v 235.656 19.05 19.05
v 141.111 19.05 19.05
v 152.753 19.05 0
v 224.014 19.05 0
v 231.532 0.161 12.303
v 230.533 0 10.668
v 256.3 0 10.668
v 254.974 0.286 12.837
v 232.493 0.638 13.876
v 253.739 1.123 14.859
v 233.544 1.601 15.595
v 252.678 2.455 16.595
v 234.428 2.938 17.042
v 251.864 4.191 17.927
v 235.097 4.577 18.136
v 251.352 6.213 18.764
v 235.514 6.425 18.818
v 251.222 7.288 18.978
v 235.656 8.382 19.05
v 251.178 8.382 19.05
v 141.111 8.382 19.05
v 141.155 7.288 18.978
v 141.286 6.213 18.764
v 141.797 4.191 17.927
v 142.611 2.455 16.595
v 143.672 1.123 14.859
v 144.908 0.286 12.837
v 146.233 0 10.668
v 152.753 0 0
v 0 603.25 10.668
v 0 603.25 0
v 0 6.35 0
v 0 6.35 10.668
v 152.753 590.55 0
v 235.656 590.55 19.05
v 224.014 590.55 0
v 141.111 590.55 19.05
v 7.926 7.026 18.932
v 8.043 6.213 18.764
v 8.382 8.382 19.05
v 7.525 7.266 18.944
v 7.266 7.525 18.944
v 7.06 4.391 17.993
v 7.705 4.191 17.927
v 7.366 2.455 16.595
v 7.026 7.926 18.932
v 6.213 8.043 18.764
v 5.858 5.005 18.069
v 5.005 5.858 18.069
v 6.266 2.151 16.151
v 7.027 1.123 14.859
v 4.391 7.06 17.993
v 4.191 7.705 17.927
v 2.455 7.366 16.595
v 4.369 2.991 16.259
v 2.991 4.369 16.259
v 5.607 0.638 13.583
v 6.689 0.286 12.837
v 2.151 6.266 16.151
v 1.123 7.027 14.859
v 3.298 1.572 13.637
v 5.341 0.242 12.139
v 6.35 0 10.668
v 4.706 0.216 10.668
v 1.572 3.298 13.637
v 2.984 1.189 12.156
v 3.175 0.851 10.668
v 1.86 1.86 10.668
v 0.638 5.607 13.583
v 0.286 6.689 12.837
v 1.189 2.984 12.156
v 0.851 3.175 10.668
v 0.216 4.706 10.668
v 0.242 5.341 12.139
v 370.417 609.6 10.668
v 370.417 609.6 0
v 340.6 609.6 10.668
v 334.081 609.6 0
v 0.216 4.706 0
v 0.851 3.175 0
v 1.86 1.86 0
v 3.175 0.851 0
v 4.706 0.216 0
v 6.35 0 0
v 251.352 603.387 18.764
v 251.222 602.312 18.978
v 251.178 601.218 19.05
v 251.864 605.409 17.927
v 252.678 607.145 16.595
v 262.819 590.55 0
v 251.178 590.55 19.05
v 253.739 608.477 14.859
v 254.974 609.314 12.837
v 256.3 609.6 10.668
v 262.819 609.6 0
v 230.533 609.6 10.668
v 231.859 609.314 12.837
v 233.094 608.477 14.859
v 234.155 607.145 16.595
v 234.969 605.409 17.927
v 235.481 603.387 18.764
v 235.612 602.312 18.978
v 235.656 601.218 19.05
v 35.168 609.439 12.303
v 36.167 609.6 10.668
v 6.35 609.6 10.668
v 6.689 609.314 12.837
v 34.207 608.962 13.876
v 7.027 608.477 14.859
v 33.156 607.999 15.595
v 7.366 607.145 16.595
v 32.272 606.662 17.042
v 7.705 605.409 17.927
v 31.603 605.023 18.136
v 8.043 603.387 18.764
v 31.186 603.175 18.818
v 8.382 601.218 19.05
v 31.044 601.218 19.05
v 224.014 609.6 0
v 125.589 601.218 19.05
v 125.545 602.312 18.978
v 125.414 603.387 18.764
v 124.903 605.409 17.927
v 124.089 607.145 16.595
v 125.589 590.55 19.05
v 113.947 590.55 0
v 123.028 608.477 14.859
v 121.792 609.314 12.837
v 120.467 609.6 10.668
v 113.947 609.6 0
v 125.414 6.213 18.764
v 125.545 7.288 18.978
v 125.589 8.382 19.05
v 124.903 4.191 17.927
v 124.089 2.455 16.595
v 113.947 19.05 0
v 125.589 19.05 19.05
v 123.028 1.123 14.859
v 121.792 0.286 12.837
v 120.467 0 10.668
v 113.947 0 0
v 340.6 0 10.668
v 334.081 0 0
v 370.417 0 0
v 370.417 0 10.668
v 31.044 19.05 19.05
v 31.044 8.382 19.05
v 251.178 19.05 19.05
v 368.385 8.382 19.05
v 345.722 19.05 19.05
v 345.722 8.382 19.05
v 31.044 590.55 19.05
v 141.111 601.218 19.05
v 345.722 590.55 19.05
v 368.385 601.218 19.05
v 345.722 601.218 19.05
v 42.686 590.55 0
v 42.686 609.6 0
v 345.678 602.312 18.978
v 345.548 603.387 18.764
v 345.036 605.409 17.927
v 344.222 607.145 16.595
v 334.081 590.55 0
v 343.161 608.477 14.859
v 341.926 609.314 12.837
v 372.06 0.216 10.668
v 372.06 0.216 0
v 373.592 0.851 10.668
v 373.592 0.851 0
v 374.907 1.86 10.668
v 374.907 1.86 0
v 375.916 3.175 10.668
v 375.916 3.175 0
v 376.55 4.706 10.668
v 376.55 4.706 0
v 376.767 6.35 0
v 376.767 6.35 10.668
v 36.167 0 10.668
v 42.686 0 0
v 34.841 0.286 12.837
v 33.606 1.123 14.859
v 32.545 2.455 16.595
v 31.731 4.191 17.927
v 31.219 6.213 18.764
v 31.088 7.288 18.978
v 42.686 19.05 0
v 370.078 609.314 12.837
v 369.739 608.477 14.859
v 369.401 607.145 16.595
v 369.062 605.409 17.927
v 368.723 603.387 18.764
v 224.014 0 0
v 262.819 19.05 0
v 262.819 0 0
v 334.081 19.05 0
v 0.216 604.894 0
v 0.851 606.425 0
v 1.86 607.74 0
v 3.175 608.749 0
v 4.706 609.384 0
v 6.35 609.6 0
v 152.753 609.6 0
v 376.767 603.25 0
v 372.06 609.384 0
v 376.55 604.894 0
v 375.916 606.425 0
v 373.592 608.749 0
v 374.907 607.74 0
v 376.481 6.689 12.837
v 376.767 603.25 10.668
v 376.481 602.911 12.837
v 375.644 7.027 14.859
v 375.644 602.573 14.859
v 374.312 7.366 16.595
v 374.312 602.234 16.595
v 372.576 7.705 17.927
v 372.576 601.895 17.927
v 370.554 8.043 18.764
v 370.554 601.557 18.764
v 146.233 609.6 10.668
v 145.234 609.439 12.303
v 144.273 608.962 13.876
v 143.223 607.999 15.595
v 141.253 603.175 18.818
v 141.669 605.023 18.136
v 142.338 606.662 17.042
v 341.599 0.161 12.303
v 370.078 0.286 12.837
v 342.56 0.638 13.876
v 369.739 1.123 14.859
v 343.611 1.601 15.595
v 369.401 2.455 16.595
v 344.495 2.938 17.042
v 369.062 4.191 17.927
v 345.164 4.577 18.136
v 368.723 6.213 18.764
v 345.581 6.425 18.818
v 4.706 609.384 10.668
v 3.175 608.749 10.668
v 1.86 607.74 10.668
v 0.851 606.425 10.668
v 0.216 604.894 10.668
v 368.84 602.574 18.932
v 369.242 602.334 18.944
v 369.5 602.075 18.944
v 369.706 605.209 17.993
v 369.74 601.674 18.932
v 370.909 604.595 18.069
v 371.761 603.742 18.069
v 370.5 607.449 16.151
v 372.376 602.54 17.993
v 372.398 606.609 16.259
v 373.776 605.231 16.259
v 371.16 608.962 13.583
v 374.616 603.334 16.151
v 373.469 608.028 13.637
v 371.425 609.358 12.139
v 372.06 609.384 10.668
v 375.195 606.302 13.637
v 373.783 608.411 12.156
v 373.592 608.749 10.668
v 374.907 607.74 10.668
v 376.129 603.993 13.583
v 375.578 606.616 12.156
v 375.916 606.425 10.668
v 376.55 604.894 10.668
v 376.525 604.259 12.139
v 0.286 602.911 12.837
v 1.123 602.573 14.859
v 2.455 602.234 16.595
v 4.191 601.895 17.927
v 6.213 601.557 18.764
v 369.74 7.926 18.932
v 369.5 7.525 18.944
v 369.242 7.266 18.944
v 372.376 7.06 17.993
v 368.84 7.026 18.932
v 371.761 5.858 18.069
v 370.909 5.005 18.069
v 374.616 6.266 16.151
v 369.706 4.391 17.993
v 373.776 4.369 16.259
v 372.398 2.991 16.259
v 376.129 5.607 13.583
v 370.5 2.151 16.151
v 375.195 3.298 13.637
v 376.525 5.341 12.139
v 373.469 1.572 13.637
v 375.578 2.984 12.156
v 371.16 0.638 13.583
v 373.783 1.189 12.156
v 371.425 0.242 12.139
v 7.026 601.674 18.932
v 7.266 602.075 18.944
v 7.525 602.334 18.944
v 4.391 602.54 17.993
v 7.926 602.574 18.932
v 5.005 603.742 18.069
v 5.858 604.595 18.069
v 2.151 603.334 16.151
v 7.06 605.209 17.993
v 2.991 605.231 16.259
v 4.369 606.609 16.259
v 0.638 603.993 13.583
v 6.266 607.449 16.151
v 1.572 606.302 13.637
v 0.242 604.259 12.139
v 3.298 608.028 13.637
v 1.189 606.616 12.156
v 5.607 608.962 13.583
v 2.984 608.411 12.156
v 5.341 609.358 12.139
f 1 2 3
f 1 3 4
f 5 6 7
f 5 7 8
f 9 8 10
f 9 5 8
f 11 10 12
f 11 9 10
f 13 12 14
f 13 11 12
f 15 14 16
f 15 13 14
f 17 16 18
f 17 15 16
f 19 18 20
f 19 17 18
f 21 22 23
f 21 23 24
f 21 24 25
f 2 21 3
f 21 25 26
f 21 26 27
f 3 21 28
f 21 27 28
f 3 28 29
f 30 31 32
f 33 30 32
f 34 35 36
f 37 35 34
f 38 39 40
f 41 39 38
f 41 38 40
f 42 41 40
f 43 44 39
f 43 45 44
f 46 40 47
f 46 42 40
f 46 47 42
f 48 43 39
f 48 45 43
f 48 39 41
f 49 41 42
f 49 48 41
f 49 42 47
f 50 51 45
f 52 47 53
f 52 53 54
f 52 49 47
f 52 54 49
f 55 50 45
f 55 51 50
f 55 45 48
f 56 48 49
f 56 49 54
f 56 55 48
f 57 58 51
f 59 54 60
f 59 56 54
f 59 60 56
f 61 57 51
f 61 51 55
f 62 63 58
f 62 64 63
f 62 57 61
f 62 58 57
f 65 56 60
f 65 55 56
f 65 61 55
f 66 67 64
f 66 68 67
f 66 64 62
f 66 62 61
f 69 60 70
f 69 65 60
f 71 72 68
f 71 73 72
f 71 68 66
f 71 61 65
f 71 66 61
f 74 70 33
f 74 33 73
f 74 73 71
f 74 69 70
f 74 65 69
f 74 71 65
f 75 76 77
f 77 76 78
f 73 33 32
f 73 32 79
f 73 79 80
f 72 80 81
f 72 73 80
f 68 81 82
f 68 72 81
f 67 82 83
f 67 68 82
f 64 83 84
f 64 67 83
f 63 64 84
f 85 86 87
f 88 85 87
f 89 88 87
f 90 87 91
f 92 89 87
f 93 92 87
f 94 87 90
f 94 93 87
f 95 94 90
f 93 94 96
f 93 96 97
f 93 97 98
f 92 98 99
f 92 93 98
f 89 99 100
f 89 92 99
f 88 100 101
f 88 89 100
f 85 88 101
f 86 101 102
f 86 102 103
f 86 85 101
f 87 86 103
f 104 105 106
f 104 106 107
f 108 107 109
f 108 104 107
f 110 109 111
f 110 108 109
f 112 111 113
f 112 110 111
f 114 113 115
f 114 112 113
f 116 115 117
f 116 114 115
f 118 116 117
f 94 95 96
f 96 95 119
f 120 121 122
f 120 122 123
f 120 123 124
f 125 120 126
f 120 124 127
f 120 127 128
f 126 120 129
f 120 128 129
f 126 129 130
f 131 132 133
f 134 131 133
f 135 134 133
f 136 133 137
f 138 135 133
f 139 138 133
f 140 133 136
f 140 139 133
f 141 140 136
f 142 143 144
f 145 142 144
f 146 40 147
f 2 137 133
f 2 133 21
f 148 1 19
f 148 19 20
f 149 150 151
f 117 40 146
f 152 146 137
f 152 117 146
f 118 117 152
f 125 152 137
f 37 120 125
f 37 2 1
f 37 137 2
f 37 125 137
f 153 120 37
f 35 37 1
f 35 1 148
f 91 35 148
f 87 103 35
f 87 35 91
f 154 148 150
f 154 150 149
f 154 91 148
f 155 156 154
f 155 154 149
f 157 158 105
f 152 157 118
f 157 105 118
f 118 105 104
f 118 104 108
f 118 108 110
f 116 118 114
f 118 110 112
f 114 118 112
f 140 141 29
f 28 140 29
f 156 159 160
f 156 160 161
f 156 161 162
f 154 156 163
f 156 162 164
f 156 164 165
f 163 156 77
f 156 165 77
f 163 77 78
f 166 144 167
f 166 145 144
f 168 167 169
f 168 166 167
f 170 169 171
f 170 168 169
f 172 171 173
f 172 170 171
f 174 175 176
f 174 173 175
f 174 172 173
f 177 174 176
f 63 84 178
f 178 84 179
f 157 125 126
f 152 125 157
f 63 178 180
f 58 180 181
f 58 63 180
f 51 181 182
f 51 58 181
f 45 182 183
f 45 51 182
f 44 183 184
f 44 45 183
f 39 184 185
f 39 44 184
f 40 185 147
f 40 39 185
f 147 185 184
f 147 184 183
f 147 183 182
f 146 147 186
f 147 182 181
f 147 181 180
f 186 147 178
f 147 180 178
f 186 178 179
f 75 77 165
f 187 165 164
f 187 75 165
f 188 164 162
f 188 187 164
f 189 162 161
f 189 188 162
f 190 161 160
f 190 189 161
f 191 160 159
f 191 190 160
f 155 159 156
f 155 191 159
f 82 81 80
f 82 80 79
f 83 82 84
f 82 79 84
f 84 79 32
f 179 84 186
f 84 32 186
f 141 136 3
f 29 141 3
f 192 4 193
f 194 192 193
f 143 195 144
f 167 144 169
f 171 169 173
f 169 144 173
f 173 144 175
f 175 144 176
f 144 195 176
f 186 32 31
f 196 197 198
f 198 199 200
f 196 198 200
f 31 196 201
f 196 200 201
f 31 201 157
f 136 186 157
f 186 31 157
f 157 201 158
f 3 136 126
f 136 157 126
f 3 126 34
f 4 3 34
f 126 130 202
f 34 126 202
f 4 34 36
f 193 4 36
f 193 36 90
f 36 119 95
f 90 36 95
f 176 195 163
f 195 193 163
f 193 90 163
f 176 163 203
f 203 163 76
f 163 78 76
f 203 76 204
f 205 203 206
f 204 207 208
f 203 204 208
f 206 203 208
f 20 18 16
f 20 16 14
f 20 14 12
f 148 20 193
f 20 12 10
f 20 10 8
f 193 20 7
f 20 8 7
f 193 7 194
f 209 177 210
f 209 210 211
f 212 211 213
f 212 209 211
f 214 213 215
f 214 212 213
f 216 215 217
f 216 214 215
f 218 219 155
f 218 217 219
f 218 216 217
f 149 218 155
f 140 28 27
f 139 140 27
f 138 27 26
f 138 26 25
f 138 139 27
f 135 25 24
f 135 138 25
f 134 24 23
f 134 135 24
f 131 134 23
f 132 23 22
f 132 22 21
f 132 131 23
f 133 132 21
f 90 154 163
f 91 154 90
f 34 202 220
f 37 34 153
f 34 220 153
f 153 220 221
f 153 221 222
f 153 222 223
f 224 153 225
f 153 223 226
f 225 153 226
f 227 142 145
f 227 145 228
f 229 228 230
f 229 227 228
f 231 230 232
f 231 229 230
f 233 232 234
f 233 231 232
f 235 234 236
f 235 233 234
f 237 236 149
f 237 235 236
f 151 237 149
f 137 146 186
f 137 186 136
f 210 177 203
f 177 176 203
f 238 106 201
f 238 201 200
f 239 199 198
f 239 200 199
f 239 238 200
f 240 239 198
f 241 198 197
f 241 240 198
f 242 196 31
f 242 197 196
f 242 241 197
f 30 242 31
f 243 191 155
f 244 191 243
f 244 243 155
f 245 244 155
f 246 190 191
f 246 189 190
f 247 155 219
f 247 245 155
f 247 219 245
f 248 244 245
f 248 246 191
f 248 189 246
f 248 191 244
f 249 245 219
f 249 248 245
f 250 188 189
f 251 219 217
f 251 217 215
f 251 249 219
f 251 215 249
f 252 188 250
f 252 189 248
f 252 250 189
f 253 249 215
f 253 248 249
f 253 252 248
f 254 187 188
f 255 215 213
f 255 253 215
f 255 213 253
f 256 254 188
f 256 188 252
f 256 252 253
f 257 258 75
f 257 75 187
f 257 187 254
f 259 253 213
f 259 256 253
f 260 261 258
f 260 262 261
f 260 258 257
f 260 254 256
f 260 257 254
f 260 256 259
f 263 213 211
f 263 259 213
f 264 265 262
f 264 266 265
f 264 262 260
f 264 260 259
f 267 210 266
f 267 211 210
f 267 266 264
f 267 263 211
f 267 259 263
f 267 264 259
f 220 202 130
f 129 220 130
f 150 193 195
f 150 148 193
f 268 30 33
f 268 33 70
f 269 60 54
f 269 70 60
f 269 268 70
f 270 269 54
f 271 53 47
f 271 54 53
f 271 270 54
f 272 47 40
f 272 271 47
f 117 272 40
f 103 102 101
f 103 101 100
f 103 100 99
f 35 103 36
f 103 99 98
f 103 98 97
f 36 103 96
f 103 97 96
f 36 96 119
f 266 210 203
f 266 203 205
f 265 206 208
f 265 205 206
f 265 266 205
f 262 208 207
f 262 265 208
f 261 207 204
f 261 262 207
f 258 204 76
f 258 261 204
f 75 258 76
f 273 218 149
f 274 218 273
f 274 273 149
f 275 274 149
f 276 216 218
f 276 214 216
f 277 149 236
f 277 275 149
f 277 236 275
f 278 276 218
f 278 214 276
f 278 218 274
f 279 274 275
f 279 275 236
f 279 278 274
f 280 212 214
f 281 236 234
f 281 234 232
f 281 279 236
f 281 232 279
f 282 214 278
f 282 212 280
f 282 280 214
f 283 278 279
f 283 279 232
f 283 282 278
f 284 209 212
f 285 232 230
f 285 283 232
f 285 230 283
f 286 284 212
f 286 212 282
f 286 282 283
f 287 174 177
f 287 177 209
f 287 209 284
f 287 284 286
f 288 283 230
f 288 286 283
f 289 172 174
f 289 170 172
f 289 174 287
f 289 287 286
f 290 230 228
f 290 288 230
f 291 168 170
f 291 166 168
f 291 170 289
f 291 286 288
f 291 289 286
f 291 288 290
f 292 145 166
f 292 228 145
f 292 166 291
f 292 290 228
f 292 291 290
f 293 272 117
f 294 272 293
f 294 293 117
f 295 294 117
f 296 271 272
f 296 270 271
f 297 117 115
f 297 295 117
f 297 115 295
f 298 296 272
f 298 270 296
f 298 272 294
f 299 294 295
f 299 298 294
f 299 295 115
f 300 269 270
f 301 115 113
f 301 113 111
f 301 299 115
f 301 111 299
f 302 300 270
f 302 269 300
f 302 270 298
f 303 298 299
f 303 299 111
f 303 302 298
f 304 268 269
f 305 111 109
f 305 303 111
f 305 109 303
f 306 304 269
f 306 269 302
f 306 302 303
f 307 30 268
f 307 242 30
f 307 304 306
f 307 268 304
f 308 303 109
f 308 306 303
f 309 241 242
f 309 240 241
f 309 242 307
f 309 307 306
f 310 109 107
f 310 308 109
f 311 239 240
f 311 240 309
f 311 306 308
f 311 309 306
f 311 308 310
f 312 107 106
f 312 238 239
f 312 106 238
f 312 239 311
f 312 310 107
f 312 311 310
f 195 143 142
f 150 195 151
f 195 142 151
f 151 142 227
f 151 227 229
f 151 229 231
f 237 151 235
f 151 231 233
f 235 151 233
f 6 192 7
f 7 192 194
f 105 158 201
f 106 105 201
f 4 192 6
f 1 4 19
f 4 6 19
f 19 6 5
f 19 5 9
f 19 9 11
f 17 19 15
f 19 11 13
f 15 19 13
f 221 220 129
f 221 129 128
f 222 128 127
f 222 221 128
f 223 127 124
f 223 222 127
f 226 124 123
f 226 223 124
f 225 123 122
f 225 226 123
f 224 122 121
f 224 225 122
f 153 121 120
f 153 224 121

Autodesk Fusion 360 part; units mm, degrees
sketch "Sketch2" plane through (0, 0, 0) normal (0, 0, 1) x (1, 0, 0)
  line L0 (0, 0) -> (376.7667, 0)
  line L1 (376.7667, 0) -> (376.7667, 609.6)
  line L2 (376.7667, 609.6) -> (0, 609.6)
  line L3 (0, 609.6) -> (0, 0)
  dimension "d4" = 376.7667
  dimension "d5" = 609.6
extrude "Extrude1" add sketch "Sketch2" along normal blind 19.05
sketch "Sketch3" plane through (0, 0, 19.05) normal (0, 0, 1) x (-1, 0, 0)
  line L0 (0, -609.6) -> (0, 0)
  line L1 (0, 0) -> (-376.7667, 0)
  line L2 (-376.7667, 0) -> (-376.7667, -609.6)
  line L3 (-376.7667, -609.6) -> (0, -609.6)
  line L4 (25.4, 0) -> (402.1667, 0)
  line L5 (402.1667, 0) -> (402.1667, -376.7667)
  line L6 (402.1667, -376.7667) -> (25.4, -376.7667)
  line L7 (25.4, -376.7667) -> (25.4, 0)
  dimension "d8" = 376.7667
  dimension "d9" = 376.7667
sketch "Sketch4" plane through (0, 0, 19.05) normal (0, 0, 1) x (-1, 0, 0)
  line L0 (0, -609.6) -> (0, 0)
  line L1 (0, 0) -> (-376.7667, 0)
  line L2 (-376.7667, 0) -> (-376.7667, -609.6)
  line L3 (-376.7667, -609.6) -> (0, -609.6)
  line L4 (25.4, 0) -> (71.9667, 0)
  line L5 (25.4, 0) -> (25.4, -25.4)
  line L6 (402.1667, -25.4) -> (402.1667, 0)
  line L7 (402.1667, -25.4) -> (402.1667, 0)
  line L8 (46.587, 0) -> (25.4, 0)
  line L9 (71.9667, 0) -> (56.4444, 0)
  line L10 (56.4444, 0) -> (71.9667, -25.4)
  line L11 (150.9889, 0) -> (135.4667, -25.4)
  line L12 (150.9889, 0) -> (166.5111, 0)
  line L13 (166.5111, 0) -> (182.0333, 0)
  line L14 (166.5111, 0) -> (182.0333, -25.4)
  line L15 (245.5333, -25.4) -> (261.0555, 0)
  line L16 (261.0555, 0) -> (276.5778, 0)
  line L17 (276.5778, 0) -> (292.1, -25.4)
  line L18 (355.6, -25.4) -> (371.1222, 0)
  line L19 (402.1667, 0) -> (386.6444, 0)
  line L20 (386.6444, 0) -> (371.1222, 0)
  line L21 (402.1667, 0) -> (402.1667, -376.7667)
  line L22 (402.1667, -188.3833) -> (25.4, -188.3833)
  line L23 (402.1667, -351.3667) -> (402.1667, -376.7667)
  line L24 (402.1667, -376.7667) -> (402.1667, 0)
  line L25 (166.5111, -376.7667) -> (182.0333, -376.7667)
  line L26 (386.6444, -376.7667) -> (371.1222, -376.7667)
  line L27 (25.4, -376.7667) -> (71.9667, -376.7667)
  line L28 (166.5111, -376.7667) -> (182.0333, -351.3667)
  line L29 (355.6, -351.3667) -> (371.1222, -376.7667)
  line L30 (402.1667, -351.3667) -> (402.1667, -376.7667)
  line L31 (56.4444, -376.7667) -> (71.9667, -351.3667)
  line L32 (245.5333, -351.3667) -> (261.0555, -376.7667)
  line L33 (25.4, -376.7667) -> (25.4, -351.3667)
  line L34 (261.0555, -376.7667) -> (276.5778, -376.7667)
  line L35 (71.9667, -376.7667) -> (56.4444, -376.7667)
  line L36 (46.587, -376.7667) -> (25.4, -376.7667)
  line L37 (276.5778, -376.7667) -> (292.1, -351.3667)
  line L38 (402.1667, -376.7667) -> (386.6444, -376.7667)
  line L39 (150.9889, -376.7667) -> (166.5111, -376.7667)
  line L40 (150.9889, -376.7667) -> (135.4667, -351.3667)
  line L41 (25.4, -25.4) -> (25.4, -19.05)
  line L42 (25.4, -19.05) -> (414.4129, -19.05)
  line L43 (402.1667, -351.3667) -> (402.1667, -357.7167)
  line L44 (402.1667, -357.7167) -> (12.7, -357.7167)
  dimension "d12" = 46.5667
  dimension "d13" = 25.4
  dimension "d14" = 376.7667
  dimension "d15" = 46.5667
  dimension "d16" = 63.5
  dimension "d17" = 46.5667
  dimension "d18" = 15.5222
  dimension "d20" = 15.5222
  dimension "d21" = 15.5222
  dimension "d22" = 63.5
  dimension "d24" = 46.5667
  dimension "d25" = 15.5222
  dimension "d26" = 63.5
  dimension "d456" = 376.7667
  dimension "d473" = 6.35
  dimension "d474" = 6.35
sketch "Sketch5" plane through (0, 609.6, 0) normal (0, 1, 0) x (-1, 0, 0)
  line L0 (-376.7667, 0) -> (0, 0)
  line L1 (0, 0) -> (0, 19.05)
  line L2 (0, 19.05) -> (-376.7667, 19.05)
  line L3 (-376.7667, 19.05) -> (-376.7667, 0)
  line L4 (-376.7667, 0) -> (0, 0)
  line L5 (-123.6562, -70.3757) -> (-108.134, -95.7757)
  line L6 (-328.2673, -70.3757) -> (-343.7895, -70.3757)
  line L7 (-343.7895, -70.3757) -> (-328.2673, -95.7757)
  line L8 (-154.7007, -95.7757) -> (-139.1784, -70.3757)
  line L9 (-233.7229, -70.3757) -> (-218.2007, -95.7757)
  line L10 (-374.834, -95.7757) -> (-328.2673, -95.7757)
  line L11 (-139.1784, -70.3757) -> (-123.6562, -70.3757)
  line L12 (-233.7229, -70.3757) -> (-218.2007, -70.3757)
  line L13 (-249.2451, -70.3757) -> (-264.7673, -95.7757)
  line L14 (-13.5895, -70.3757) -> (-29.1118, -70.3757)
  line L15 (-44.634, -95.7757) -> (-29.1118, -70.3757)
  line L16 (1.9327, -70.3757) -> (-13.5895, -70.3757)
  line L17 (1.9327, -95.7757) -> (1.9327, -70.3757)
  line L18 (-328.2673, -70.3757) -> (-249.2451, -70.3757)
  line L19 (-264.7673, -95.7757) -> (-328.2673, -95.7757)
  line L20 (-218.2007, -95.7757) -> (-154.7007, -95.7757)
  line L21 (-108.134, -95.7757) -> (-44.634, -95.7757)
  line L22 (-29.1118, -70.3757) -> (-123.6562, -70.3757)
  line L23 (-139.1784, -70.3757) -> (-233.7229, -70.3757)
  dimension "d463" = 63.5
  dimension "d464" = 46.5667
  dimension "d465" = 15.5222
  dimension "d466" = 15.5222
  dimension "d467" = 15.5222
  dimension "d468" = 63.5
  dimension "d469" = 46.5667
  dimension "d470" = 15.5222
  dimension "d471" = 63.5
sketch "Sketch6" plane through (0, 0, 0) normal (0, -1, 0) x (1, 0, 0)
  line L0 (0, 0) -> (376.7667, 0)
  line L1 (376.7667, 0) -> (376.7667, 19.05)
  line L2 (376.7667, 19.05) -> (0, 19.05)
  line L3 (0, 19.05) -> (0, 0)
  line L4 (46.5667, 19.05) -> (31.0444, 19.05)
  line L5 (0, -6.35) -> (0, 0)
  line L6 (361.2444, 19.05) -> (345.7222, 19.05)
  line L7 (376.7667, -6.35) -> (376.7667, 19.05)
  line L8 (31.0444, 19.05) -> (46.5667, -6.35)
  line L9 (235.6555, 19.05) -> (251.1778, 19.05)
  line L10 (125.5889, 19.05) -> (141.1111, 19.05)
  line L11 (330.2, -6.35) -> (345.7222, 19.05)
  line L12 (0, 0) -> (389.0129, 0)
  line L13 (125.5889, 19.05) -> (110.0667, -6.35)
  line L14 (376.7667, -6.35) -> (376.7667, 19.05)
  line L15 (376.7667, 19.05) -> (361.2444, 19.05)
  line L16 (0, 19.05) -> (0, -6.35)
  line L17 (0, 19.05) -> (46.5667, 19.05)
  line L18 (220.1333, -6.35) -> (235.6555, 19.05)
  line L19 (21.187, 19.05) -> (0, 19.05)
  line L20 (141.1111, 19.05) -> (156.6333, -6.35)
  line L21 (141.1111, 19.05) -> (156.6333, 19.05)
  line L22 (251.1778, 19.05) -> (266.7, -6.35)
  point P0 (376.7667, 19.05)
  dimension "d492" = 46.5667
  dimension "d493" = 25.4
  dimension "d494" = 376.7667
  dimension "d495" = 46.5667
  dimension "d496" = 63.5
  dimension "d497" = 46.5667
  dimension "d498" = 15.5222
  dimension "d499" = 15.5222
  dimension "d500" = 15.5222
  dimension "d501" = 63.5
  dimension "d502" = 46.5667
  dimension "d503" = 15.5222
  dimension "d504" = 63.5
  dimension "d505" = 6.35
fillet "Fillet2" radius 6.35 4 edges at (376.7667, 0, 9.525) (0, 0, 9.525) (376.7667, 609.6, 9.525) (0, 609.6, 9.525)
fillet "Fillet3" radius 8.382 8 edges at (374.9068, 607.7401, 19.05) (188.3833, 609.6, 19.05) (1.8599, 607.7401, 19.05) (0, 304.8, 19.05) (1.8599, 1.8599, 19.05) (188.3833, 0, 19.05) (374.9068, 1.8599, 19.05) (376.7667, 304.8, 19.05)
extrude "Extrude6" cut sketch "Sketch6" against normal blind 19.05 contours L0 L2 L4 L8 L12 L13 L17 | L0 L2 L12 L18 L20 L21 | L0 L2 L11 L12 L22
sketch "Sketch7" plane through (0, 609.6, 0) normal (0, 1, 0) x (-1, 0, 0)
  line L0 (-370.4167, 0) -> (-6.35, 0)
  line L1 (0, 19.05) -> (-376.7667, 19.05)
  line L2 (-376.7667, 19.05) -> (-376.7667, 0)
  line L3 (-355.5797, 19.05) -> (-376.7667, 19.05)
  line L4 (-376.7667, 19.05) -> (-376.7667, -6.35)
  line L5 (-345.7222, 19.05) -> (-330.2, -6.35)
  line L6 (-376.7667, 19.05) -> (-330.2, 19.05)
  line L7 (-376.7667, 0) -> (0, 0)
  line L8 (-330.2, 19.05) -> (-345.7222, 19.05)
  line L9 (-156.6334, -6.35) -> (-141.1111, 19.05)
  line L10 (-251.1778, 19.05) -> (-266.7, -6.35)
  line L11 (-46.5667, -6.35) -> (-31.0445, 19.05)
  line L12 (-141.1111, 19.05) -> (-125.5889, 19.05)
  line L13 (-125.5889, 19.05) -> (-110.0667, -6.35)
  line L14 (-235.6556, 19.05) -> (-220.1333, 19.05)
  line L15 (-251.1778, 19.05) -> (-235.6556, 19.05)
  line L16 (-15.5222, 19.05) -> (-31.0445, 19.05)
  line L17 (0, -6.35) -> (0, 19.05)
  line L18 (0, -6.35) -> (0, 19.05)
  line L19 (-235.6556, 19.05) -> (-220.1334, -6.35)
  line L20 (0, 0) -> (0, 19.05)
  line L21 (0, 19.05) -> (-15.5222, 19.05)
  line L22 (0, 19.05) -> (0, 9.525)
  line L23 (-15.5222, 0) -> (-31.0445, 0)
  line L24 (-330.2, 0) -> (-345.7222, 0)
  line L25 (-235.6556, 0) -> (-220.1333, 0)
  line L26 (-376.7667, 0) -> (-330.2, 0)
  line L27 (-376.7667, 0) -> (-376.7667, 19.05)
  line L28 (-355.5797, 0) -> (-376.7667, 0)
  line L29 (-141.1111, 0) -> (-125.5889, 0)
  line L30 (0, 0) -> (-15.5222, 0)
  line L31 (-251.1778, 0) -> (-235.6556, 0)
  line L32 (0, 0) -> (0, 9.525)
  line L33 (-376.7667, 19.05) -> (0, 19.05)
  line L34 (0, 19.05) -> (0, 0)
  line L35 (-376.7667, 19.05) -> (0, 19.05)
  line L36 (-376.7667, 0) -> (-376.7667, 25.4)
  line L37 (0, 0) -> (-376.7667, 0)
  line L38 (-376.7667, 0) -> (-376.7667, 19.05)
  line L39 (0, 19.05) -> (0, 0)
  line L40 (0, 0) -> (-376.7667, 0)
  line L41 (-6.35, 10.668) -> (-370.4167, 10.668)
  line L42 (-370.4167, 10.668) -> (-370.4167, 0)
  line L43 (-6.35, 0) -> (-6.35, 10.668)
  point P0 (0, 19.05)
  point P1 (-376.7667, 0)
  point P2 (0, 0)
  point P3 (-376.7667, 19.05)
  point P4 (0, 19.05)
  dimension "d522" = 46.5667
  dimension "d523" = 25.4
  dimension "d524" = 376.7667
  dimension "d525" = 46.5667
  dimension "d526" = 63.5
  dimension "d527" = 46.5667
  dimension "d528" = 15.5222
  dimension "d529" = 15.5222
  dimension "d530" = 15.5222
  dimension "d531" = 63.5
  dimension "d532" = 46.5667
  dimension "d533" = 15.5222
  dimension "d534" = 63.5
extrude "Extrude7" cut sketch "Sketch7" against normal blind 19.05 contours L0 L5 L7 L10 L24 L26 L37 L40 L41 | L1 L5 L6 L8 L10 L33 L35 L41 | L0 L7 L9 L19 L25 L37 L40 L41 | L1 L9 L14 L19 L33 L35 L41 | L0 L7 L11 L13 L37 L40 L41 | L1 L11 L13 L33 L35 L41
